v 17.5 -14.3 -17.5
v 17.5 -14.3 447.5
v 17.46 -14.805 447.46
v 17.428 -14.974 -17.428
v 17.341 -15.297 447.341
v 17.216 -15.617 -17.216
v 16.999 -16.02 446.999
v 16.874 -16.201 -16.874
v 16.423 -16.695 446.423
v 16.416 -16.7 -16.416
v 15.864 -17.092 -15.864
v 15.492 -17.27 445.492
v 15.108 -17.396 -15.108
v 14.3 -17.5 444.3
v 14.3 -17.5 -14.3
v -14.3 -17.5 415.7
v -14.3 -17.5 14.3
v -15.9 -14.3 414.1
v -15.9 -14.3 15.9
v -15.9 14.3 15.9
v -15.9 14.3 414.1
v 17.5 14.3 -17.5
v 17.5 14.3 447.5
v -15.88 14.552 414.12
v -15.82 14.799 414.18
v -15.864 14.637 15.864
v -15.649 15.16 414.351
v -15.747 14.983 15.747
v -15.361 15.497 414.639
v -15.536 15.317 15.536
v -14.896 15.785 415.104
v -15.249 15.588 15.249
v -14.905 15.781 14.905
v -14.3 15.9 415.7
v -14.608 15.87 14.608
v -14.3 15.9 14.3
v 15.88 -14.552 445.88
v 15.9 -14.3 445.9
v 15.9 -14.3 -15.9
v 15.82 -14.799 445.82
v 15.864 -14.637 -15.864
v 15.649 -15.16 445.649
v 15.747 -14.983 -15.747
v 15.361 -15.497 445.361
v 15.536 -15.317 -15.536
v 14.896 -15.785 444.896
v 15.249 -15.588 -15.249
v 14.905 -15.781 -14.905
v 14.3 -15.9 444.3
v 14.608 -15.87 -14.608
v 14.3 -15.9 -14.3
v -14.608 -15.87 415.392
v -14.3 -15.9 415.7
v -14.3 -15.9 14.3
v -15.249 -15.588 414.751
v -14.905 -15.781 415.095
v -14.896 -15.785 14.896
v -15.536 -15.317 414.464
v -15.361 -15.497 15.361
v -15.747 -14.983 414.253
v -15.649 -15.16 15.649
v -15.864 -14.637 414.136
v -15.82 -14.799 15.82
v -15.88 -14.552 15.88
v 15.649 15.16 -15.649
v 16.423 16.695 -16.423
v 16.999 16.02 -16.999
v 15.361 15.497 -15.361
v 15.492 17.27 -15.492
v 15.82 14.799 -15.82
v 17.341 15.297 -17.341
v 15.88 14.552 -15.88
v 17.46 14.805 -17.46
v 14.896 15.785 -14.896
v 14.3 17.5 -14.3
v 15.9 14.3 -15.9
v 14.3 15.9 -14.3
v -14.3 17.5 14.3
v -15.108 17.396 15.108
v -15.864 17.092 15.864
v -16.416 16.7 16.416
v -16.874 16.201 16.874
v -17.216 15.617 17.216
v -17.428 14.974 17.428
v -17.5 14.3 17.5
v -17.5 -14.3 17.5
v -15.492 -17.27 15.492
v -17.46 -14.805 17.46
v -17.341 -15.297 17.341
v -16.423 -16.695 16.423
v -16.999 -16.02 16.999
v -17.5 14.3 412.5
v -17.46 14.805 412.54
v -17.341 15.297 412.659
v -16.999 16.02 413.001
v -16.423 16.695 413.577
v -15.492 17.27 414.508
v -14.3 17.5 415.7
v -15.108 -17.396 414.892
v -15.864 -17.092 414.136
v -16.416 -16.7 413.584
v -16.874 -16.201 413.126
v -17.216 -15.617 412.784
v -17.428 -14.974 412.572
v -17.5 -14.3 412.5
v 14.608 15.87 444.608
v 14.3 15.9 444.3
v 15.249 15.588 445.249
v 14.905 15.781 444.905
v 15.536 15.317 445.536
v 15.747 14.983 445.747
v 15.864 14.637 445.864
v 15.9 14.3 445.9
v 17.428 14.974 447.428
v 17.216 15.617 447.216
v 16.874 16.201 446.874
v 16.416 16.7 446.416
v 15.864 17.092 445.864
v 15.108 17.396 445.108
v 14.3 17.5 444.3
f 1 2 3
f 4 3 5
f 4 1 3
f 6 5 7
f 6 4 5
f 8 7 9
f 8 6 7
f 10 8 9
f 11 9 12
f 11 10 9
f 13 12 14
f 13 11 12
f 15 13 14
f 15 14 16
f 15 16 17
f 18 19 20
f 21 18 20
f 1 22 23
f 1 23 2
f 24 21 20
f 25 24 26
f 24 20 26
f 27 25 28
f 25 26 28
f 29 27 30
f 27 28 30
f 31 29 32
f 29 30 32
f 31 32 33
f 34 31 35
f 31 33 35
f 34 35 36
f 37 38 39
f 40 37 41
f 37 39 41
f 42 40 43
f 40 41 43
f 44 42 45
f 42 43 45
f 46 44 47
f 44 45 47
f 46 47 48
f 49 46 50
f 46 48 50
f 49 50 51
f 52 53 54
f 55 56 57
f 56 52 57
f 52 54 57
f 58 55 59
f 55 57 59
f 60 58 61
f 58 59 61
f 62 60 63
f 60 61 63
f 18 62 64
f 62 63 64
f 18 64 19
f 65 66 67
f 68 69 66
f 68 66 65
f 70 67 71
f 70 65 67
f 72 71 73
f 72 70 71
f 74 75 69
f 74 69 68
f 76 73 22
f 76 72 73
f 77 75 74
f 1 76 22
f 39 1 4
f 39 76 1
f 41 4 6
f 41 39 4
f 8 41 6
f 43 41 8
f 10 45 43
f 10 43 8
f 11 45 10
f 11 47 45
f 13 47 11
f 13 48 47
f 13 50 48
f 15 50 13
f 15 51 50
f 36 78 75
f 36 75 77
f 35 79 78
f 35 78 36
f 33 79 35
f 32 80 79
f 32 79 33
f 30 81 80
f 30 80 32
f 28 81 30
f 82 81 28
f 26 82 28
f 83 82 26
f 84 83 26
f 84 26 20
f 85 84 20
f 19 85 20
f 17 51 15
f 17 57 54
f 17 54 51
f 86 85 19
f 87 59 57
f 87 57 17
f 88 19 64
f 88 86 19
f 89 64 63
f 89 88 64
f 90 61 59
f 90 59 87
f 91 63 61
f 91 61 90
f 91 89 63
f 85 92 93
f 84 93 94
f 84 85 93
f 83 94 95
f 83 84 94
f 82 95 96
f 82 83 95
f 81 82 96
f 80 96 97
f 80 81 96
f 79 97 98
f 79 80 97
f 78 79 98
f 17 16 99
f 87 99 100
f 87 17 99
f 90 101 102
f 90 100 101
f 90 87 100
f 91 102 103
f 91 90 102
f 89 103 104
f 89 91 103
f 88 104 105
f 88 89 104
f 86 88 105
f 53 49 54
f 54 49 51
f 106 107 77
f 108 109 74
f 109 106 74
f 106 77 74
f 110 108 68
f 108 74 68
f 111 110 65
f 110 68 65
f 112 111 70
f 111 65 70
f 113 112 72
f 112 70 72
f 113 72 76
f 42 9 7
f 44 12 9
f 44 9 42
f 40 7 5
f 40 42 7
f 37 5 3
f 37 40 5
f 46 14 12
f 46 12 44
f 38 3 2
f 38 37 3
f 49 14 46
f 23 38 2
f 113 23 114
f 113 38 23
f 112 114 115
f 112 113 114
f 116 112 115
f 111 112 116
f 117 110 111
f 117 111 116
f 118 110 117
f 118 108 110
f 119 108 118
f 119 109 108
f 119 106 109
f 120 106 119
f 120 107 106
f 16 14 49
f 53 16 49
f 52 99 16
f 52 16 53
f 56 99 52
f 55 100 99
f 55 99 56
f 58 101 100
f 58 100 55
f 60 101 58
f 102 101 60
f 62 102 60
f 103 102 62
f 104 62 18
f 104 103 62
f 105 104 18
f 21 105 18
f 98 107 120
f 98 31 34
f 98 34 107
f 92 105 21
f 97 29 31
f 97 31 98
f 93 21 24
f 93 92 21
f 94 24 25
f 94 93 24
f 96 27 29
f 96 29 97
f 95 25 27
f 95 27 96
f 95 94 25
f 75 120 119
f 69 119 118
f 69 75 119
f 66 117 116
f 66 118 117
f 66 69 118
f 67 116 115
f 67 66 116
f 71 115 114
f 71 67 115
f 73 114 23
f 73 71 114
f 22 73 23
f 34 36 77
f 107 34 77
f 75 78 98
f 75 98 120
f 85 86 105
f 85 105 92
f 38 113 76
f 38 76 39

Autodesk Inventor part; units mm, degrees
ref_plane "Start plane" through (0, 0, -17.5) normal (0, 0, 1) x (1, 0, 0)
ref_plane "End plane" through (0, 0, 447.5) normal (0, 0, 1) x (1, 0, 0)
sketch "Sketch" plane through (0, 0, 0) normal (0, 0, 1) x (1, 0, 0)
  line L0 (-17.5, -14.3) -> (-17.5, 14.3)
  line L1 (-14.3, 17.5) -> (14.3, 17.5)
  line L2 (17.5, 14.3) -> (17.5, -14.3)
  line L3 (14.3, -17.5) -> (-14.3, -17.5)
  arc A0 (-17.5, -14.3) -> (-14.3, -17.5) centre (-14.3, -14.3) ccw
  arc A1 (-14.3, 17.5) -> (-17.5, 14.3) centre (-14.3, 14.3) ccw
  arc A2 (17.5, 14.3) -> (14.3, 17.5) centre (14.3, 14.3) ccw
  arc A3 (14.3, -17.5) -> (17.5, -14.3) centre (14.3, -14.3) ccw
  arc A4 (-14.3, 15.9) -> (-15.9, 14.3) centre (-14.3, 14.3) ccw
  line L4 (-14.3, 15.9) -> (14.3, 15.9)
  arc A5 (15.9, 14.3) -> (14.3, 15.9) centre (14.3, 14.3) ccw
  line L5 (15.9, 14.3) -> (15.9, -14.3)
  arc A6 (14.3, -15.9) -> (15.9, -14.3) centre (14.3, -14.3) ccw
  line L6 (14.3, -15.9) -> (-14.3, -15.9)
  arc A7 (-15.9, -14.3) -> (-14.3, -15.9) centre (-14.3, -14.3) ccw
  line L7 (-15.9, -14.3) -> (-15.9, 14.3)
  line L8 (0, 25.4278) -> (0, -25.4278) construction
  line L9 (-25.4278, 0) -> (25.4278, 0) construction
  dimension "d7" = 3.2
  dimension "d10" = 35
  dimension "d11" = 35
  dimension "d12" = 1.6
  dimension "d15" = 17.5
  dimension "d16" = 17.5
extrude "Body" add sketch "Sketch" along normal up to surface (465 mm away) from surface at -17.5
sketch "Sketch3" plane through (0, 0, 0) normal (0, 0, 1) x (1, 0, 0)
  line L0 (0, 0) -> (10, 0)
ref_plane "Work Plane3" through (0, 0, 0) normal (0, -1, 0) x (1, 0, 0)
sketch "Sketch4" plane through (0, 0, 0) normal (0, -1, 0) x (1, 0, 0)
  line L0 (-2, -17.5) -> (12, -17.5)
  line L1 (-2, 447.5) -> (12, 447.5)
  dimension "d18" = 465
ref_plane "Work Plane5" through (17.5, 0, 447.5) normal (-0.7071, 0, 0.7071) x (0.7071, 0, 0.7071)
split "Split2" plane through (17.5, 0, 447.5) removes the side toward (-0.7071, 0, 0.7071)
ref_plane "Work Plane12" through (0, 180, -17.5) normal (0, 0, -1) x (-1, 0, 0)
split "Split6" plane through (0, 180, -17.5) removes the side toward (0, 0, -1)
ref_plane "Work Plane13" through (17.5, 0, -17.5) normal (-0.7071, 0, -0.7071) x (-0.7071, 0, 0.7071)
split "Split7" plane through (17.5, 0, -17.5) removes the side toward (-0.7071, 0, -0.7071)
equation "\"d7\" = G_IR"
equation "\"d10\" = G_H"
equation "\"d11\" = G_W"
equation "\"d12\" = G_T"
equation "\"d15\" = 0.5 * d10"
equation "\"d16\" = 0.5 * d11"
equation "\"d3\" = G_L"
equation "\"G_W\" = 35"
equation "\"G_H\" = 35"
equation "\"G_T\" = 1.6"
equation "\"G_IR\" = 3.2"
equation "\"G_L\" = d18"
equation "\"G_OFFSET_START\" = 17.5"
equation "\"G_OFFSET_END\" = 17.5"
equation "\"d13\" = -G_OFFSET_START"
equation "\"d14\" = G_OFFSET_END + B_L"
equation "\"B_L\" = 430"
properties part number "AS 1163 - C350L0 35x35x1.6 SHS - 465" material "Steel, Mild"
